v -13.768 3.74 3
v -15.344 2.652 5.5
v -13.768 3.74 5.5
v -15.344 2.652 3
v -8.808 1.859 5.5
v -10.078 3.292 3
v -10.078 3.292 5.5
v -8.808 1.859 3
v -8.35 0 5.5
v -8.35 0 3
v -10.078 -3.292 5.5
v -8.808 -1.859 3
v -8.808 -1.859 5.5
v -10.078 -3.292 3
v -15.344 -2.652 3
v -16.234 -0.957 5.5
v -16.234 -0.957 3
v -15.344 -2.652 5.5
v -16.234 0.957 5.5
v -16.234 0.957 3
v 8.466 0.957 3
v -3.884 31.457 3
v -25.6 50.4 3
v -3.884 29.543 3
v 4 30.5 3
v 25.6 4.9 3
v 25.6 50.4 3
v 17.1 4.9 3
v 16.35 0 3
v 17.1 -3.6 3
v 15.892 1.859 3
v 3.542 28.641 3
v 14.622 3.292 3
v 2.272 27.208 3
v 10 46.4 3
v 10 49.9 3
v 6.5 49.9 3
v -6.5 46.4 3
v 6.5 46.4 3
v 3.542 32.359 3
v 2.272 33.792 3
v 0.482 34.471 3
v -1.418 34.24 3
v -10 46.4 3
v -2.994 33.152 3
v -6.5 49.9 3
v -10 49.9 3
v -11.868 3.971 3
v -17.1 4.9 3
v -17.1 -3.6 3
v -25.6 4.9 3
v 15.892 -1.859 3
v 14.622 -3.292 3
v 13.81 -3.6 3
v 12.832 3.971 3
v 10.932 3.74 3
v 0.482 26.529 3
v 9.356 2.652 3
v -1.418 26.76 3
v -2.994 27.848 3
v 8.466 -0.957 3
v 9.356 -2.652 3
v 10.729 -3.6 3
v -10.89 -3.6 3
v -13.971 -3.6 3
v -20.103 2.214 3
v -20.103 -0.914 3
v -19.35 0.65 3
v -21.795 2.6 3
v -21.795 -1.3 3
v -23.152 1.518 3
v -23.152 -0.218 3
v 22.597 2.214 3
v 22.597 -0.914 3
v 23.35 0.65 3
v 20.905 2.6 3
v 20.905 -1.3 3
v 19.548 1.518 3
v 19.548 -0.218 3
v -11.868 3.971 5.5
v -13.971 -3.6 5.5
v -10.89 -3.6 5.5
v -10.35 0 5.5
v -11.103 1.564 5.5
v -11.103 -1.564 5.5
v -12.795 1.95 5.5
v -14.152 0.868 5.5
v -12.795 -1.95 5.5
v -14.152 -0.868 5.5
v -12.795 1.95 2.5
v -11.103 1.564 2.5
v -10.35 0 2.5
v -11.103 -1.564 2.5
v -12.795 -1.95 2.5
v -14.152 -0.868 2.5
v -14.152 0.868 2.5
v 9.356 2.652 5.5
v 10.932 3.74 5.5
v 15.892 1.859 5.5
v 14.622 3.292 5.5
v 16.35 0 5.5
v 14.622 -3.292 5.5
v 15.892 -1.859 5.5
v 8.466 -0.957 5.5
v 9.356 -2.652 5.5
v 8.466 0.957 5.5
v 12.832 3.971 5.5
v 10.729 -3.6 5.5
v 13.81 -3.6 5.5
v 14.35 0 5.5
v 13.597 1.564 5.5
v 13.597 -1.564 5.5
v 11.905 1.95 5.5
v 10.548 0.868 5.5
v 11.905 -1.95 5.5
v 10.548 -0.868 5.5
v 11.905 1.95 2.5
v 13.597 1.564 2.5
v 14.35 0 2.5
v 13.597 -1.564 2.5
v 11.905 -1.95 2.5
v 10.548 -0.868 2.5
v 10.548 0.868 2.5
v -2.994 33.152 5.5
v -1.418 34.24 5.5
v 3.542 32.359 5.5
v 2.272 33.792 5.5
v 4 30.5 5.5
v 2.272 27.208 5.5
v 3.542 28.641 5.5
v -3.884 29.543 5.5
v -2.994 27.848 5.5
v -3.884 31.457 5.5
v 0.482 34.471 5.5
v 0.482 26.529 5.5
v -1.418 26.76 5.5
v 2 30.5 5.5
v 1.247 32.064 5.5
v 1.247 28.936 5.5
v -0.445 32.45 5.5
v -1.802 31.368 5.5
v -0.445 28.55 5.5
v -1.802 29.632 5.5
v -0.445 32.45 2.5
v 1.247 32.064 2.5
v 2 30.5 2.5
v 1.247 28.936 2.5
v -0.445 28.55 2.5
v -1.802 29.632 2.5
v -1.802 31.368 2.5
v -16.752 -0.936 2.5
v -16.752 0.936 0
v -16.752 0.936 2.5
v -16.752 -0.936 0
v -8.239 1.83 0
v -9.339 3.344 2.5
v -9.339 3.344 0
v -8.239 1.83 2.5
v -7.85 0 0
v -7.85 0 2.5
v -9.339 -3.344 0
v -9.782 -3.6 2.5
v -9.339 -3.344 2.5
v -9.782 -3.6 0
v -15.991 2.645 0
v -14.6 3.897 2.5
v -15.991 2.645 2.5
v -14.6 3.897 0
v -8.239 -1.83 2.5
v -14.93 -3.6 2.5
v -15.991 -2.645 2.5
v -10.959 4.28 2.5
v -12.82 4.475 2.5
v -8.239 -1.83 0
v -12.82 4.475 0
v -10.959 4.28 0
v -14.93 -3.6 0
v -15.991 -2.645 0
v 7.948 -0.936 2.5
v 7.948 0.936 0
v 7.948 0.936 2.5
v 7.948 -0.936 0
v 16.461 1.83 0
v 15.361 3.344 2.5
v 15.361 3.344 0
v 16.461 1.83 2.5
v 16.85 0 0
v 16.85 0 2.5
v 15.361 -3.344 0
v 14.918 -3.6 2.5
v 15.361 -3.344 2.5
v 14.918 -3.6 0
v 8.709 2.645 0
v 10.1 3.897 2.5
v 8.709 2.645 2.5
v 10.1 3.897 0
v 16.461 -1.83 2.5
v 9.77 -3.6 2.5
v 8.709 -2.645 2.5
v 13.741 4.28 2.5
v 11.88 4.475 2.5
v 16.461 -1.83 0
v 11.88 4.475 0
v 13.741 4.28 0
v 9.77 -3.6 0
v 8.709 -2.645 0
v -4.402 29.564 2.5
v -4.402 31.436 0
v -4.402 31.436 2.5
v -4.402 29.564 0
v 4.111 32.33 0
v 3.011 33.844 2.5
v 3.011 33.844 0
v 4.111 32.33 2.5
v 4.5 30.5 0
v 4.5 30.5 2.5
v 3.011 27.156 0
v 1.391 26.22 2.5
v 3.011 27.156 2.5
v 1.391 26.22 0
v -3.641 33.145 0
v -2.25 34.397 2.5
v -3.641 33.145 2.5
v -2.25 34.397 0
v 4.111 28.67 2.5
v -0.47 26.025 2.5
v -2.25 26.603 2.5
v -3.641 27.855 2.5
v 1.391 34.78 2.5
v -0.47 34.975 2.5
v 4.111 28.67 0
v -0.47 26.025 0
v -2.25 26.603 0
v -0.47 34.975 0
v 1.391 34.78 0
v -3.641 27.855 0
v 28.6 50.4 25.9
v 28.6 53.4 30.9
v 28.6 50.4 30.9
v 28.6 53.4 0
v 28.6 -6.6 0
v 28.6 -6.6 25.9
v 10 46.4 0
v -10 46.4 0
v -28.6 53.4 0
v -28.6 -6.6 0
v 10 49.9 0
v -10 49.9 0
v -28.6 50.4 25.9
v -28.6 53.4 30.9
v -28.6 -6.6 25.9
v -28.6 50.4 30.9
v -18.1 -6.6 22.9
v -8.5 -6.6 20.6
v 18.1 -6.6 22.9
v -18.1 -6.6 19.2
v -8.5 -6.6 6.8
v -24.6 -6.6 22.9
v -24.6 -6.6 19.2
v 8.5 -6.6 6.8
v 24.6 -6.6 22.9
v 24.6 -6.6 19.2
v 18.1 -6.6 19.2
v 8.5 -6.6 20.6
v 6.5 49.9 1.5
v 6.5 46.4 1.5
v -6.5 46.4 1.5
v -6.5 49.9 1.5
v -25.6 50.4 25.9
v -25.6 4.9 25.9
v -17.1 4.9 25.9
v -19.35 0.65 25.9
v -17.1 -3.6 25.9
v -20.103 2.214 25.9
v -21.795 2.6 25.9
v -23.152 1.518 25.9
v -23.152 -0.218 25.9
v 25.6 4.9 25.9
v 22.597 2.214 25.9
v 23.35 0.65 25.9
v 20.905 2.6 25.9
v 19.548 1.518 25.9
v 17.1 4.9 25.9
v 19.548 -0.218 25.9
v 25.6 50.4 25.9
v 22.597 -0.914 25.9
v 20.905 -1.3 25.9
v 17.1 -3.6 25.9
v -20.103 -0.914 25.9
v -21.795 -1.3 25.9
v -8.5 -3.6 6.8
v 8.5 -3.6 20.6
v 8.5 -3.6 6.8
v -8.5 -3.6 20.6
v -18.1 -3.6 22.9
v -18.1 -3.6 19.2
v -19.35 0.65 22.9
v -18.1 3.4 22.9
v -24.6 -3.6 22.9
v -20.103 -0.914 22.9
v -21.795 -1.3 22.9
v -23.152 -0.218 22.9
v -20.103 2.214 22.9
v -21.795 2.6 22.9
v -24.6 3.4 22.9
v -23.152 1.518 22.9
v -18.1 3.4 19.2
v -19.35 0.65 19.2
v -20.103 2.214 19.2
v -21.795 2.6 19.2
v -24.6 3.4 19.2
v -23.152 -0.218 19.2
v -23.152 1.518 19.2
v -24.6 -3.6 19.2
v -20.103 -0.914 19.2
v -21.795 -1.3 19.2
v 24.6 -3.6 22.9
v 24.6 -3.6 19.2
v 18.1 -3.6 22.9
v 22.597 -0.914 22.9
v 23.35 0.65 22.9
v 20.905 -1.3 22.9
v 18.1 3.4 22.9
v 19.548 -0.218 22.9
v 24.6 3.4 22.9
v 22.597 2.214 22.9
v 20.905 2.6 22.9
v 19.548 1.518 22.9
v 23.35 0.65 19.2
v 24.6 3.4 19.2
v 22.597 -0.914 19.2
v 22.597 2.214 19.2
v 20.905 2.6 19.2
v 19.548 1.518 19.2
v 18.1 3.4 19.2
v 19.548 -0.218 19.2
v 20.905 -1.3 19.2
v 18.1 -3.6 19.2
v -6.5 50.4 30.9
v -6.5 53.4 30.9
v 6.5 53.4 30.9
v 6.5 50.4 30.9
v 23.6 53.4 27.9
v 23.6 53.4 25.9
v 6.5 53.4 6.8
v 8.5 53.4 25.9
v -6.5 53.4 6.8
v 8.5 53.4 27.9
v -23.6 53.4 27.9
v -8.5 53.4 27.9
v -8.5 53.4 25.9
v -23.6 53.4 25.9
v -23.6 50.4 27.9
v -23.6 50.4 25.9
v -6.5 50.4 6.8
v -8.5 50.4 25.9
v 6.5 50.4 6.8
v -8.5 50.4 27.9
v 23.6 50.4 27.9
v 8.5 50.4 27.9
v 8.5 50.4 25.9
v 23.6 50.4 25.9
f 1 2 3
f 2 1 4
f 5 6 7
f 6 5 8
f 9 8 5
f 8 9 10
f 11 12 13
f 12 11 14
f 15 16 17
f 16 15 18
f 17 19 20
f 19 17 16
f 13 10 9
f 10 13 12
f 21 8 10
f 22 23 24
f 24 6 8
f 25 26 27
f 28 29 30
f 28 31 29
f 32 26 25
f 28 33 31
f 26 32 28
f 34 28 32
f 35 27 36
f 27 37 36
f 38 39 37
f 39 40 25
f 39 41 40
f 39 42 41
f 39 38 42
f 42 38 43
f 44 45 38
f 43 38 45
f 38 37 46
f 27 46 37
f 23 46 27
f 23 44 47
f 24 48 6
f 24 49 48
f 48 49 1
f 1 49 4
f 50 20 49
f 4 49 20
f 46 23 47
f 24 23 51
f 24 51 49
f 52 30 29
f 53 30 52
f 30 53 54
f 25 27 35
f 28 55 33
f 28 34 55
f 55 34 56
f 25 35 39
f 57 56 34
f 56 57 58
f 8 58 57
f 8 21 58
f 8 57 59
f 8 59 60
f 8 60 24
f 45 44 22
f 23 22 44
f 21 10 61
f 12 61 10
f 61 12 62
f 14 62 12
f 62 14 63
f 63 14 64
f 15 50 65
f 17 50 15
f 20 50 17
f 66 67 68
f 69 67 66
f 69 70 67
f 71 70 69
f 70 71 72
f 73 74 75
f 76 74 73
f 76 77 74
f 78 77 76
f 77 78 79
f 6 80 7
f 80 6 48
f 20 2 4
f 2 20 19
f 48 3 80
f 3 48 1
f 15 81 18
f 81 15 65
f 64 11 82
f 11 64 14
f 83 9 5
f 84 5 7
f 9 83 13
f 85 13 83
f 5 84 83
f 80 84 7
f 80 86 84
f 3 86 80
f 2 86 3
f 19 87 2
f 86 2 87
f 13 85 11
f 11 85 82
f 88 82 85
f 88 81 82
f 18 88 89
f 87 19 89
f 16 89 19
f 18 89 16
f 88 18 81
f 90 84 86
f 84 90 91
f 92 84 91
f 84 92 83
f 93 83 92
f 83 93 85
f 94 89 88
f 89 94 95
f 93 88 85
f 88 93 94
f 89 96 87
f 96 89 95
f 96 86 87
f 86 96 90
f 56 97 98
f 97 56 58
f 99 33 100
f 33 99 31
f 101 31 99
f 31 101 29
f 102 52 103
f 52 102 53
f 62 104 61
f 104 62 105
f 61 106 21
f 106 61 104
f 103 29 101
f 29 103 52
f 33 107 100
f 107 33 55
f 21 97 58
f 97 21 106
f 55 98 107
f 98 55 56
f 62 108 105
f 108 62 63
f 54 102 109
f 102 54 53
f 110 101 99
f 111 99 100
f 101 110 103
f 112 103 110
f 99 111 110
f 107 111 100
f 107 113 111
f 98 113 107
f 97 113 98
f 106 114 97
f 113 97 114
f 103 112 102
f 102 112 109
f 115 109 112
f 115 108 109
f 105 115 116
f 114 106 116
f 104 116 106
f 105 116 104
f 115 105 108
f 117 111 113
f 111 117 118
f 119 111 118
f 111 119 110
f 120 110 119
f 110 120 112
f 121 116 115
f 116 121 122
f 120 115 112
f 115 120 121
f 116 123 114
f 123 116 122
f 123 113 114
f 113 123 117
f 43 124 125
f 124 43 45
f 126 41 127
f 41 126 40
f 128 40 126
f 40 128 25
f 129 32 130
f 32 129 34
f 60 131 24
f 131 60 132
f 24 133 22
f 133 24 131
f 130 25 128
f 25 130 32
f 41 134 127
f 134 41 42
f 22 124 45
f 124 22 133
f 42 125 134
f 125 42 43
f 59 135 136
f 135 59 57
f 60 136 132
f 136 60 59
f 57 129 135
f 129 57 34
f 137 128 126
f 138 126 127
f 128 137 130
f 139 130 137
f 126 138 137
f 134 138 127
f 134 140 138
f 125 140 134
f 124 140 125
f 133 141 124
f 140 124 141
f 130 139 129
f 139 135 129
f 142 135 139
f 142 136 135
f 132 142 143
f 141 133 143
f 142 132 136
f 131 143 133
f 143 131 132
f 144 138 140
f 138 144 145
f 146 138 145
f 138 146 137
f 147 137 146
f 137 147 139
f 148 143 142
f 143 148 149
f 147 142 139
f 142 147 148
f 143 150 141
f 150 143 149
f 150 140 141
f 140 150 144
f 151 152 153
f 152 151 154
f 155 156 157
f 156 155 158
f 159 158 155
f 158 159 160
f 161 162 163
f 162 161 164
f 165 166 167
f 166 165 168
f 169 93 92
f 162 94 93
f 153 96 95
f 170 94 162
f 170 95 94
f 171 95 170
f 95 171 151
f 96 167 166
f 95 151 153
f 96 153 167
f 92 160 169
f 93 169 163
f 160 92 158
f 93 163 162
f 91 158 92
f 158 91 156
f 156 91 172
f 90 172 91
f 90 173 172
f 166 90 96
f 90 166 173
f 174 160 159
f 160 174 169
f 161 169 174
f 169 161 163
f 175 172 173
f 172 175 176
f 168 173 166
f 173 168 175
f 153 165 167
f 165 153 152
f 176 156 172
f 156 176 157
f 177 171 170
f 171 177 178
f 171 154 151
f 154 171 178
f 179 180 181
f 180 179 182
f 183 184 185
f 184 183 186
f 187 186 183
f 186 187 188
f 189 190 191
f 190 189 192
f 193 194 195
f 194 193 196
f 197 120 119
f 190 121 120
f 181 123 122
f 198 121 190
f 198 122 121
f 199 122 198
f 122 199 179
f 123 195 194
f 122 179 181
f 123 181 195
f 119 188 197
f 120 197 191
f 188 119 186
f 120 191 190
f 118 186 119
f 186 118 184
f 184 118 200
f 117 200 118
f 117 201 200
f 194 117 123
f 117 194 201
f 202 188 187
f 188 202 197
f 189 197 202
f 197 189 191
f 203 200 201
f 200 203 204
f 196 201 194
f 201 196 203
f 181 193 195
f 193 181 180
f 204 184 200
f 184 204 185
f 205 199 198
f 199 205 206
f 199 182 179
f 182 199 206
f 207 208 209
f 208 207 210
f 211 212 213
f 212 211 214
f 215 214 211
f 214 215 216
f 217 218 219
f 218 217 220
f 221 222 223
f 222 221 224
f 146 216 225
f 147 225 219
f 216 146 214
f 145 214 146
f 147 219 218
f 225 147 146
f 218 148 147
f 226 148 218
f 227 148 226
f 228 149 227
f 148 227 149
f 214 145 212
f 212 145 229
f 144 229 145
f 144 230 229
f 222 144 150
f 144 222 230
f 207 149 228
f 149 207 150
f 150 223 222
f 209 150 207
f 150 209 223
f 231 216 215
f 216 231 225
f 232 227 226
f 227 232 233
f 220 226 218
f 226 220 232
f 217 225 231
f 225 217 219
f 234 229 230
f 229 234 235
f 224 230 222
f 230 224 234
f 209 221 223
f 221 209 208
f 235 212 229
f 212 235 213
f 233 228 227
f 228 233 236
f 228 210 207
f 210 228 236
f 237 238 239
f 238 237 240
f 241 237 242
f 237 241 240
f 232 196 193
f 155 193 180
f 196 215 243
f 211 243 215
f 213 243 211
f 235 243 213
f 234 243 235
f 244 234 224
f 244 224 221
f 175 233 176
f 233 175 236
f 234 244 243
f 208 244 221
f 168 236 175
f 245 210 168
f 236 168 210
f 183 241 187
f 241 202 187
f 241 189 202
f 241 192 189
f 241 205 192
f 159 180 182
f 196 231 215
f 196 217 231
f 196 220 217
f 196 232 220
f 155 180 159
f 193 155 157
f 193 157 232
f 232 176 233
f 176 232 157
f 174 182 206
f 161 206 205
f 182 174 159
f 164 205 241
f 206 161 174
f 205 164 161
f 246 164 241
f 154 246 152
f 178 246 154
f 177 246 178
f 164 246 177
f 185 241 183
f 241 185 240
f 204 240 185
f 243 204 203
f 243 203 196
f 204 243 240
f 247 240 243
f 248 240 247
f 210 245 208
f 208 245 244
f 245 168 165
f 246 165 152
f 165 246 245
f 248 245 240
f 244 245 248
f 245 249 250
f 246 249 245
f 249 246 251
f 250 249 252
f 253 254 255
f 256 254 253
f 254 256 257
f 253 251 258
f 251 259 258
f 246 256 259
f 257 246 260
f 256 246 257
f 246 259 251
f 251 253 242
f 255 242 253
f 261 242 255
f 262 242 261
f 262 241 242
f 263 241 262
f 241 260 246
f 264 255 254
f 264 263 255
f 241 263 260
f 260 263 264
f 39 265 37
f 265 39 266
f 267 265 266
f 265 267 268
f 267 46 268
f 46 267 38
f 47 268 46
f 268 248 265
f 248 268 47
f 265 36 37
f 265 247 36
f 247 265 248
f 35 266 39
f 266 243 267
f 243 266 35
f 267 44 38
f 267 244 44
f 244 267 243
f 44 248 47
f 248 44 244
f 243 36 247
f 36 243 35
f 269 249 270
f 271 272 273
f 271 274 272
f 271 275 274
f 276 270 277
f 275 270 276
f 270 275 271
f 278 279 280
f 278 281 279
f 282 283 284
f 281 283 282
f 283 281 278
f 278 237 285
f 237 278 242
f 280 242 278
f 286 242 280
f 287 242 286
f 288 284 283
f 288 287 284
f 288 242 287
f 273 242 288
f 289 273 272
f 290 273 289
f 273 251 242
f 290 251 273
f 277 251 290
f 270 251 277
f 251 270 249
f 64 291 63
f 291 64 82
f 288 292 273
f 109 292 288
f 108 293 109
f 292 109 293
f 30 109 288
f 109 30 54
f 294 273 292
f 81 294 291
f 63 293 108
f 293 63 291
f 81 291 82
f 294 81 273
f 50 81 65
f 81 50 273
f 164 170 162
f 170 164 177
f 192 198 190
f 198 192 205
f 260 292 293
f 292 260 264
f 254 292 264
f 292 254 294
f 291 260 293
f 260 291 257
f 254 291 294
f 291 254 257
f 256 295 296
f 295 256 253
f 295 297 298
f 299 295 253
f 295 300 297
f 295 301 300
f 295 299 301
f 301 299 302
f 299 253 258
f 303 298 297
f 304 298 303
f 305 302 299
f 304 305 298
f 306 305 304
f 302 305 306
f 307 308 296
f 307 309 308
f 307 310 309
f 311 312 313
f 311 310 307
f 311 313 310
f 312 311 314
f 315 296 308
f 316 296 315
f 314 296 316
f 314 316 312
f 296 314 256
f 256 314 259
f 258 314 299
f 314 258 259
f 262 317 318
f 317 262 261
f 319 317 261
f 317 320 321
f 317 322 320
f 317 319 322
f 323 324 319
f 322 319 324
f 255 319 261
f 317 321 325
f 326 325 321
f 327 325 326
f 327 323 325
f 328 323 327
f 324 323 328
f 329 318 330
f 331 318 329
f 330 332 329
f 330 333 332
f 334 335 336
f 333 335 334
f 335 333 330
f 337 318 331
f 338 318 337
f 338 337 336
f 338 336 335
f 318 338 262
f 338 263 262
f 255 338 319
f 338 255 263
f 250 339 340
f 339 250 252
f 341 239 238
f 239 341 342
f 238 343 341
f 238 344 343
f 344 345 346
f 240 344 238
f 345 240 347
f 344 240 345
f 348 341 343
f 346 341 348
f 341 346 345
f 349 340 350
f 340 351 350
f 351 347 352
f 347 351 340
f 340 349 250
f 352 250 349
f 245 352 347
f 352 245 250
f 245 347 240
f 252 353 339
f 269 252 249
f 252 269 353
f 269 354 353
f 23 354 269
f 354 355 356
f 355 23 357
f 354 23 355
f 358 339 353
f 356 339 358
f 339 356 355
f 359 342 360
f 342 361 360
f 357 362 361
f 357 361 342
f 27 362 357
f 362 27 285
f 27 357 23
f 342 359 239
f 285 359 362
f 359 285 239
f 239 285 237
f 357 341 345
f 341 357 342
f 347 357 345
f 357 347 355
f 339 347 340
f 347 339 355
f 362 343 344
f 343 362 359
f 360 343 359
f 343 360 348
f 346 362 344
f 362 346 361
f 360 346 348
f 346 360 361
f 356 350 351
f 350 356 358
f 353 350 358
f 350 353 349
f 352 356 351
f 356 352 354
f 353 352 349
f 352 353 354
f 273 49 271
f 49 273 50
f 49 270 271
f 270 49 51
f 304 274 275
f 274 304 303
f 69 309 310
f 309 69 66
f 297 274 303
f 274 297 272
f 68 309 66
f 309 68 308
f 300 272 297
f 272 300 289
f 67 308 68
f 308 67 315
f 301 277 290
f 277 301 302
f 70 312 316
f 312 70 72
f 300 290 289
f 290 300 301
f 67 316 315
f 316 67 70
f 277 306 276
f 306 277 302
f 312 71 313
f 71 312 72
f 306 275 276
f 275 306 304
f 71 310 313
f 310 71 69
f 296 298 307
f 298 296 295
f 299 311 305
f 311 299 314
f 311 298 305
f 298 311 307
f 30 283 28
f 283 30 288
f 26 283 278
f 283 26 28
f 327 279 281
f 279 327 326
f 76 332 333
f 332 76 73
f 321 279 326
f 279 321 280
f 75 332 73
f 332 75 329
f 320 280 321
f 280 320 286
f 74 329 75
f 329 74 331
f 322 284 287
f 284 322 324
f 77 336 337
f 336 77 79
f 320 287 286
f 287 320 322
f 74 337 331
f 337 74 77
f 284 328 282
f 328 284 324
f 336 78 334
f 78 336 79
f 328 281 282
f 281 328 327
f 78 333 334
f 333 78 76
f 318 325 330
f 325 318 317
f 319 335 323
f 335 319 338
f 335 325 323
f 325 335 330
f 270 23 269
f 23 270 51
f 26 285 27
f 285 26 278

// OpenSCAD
front_post_hole_offset = 24.7;
front_post_to_pcb_front = 3.6;
front_to_rear_post_hole_offset = 30.5;

panel_depth = 3;  // The width of the case front/back/sides
panel_offset = max(0.5, panel_depth-3);
post_height = 2.5;

// Constants associated with the case lid
rear_tab_height = 2;  // The height of the tab that will lock the lid in place
rear_tab_height_offset = 1; // How much additional clearance to give the tab
tab_side_clearance = 2; // How much clearance to give each side of the tab

pcb_width = 31.6; // Width of the actual PCB (should be greater than front_post_hole_offset)
pcb_depth = 38+6; // Depth of the actual PCB (should be greater than front_to_rear_post_hole_offset);
pcb_height = 1.6; // Height of the PCB fiberglass (part of the RJ-11 offset)

rj_11_width = 17; // Width of the RJ-11 jack (for the hole in the front of the case)
rj_11_height = 13.5+.3; // Height of the RJ-11 jack (for the hole in the front of the case)

exit_hole_width = 13; // Width of the exit hole (in the back of the case)

case_interior_width = pcb_width + 19.6; // Giving 10mm of clearance on either side for wiring, etc. 
case_interior_depth = pcb_depth + 10; // All additional depth is added to the back
case_interior_height = post_height+rj_11_height+pcb_height+5; // This should be equal to post_height + enough room for the RJ-11 jack at a minimum

zip_tie_width = 3.5;


////// These are defined based on the above. Breaking out to make it more explicit what is happening below)
case_exterior_width = case_interior_width + (panel_depth * 2);
case_exterior_depth = case_interior_depth + (panel_depth * 2);
case_exterior_height = case_interior_height + panel_depth;

// Related to the case lid
case_lid_depth = rear_tab_height + rear_tab_height_offset + 2;
tab_width = (case_exterior_width - exit_hole_width - (2*panel_depth) - (4*tab_side_clearance))/2;


// Related to the "nut slot" posts
nut_width = 5.5;
nut_height = 2.5;
nut_post_width = nut_width + 3;
nut_hole_height = nut_height + 1.2;
nut_hole_width = nut_width + 1;
nut_hole_depth = (nut_post_width-nut_width)/2 + nut_width;
nut_hole_height_loc = case_exterior_height - 3 - nut_hole_height;
nut_hole_width_loc = (nut_post_width - nut_hole_width)/2;


module post_with_nut(panel_depth, panel_offset, post_height, negative_only=0) {

    post_radius = 4;
    screw_radius = 2;

    // Used to create a "standard" hex nut object
    module std_hex(hole_depth) {
            width_between_flats = 7;
            flat_width = 4.04;
            module hex_nut(width_between_flats,flat_width,hole_depth) {
                translate([-width_between_flats/2,-flat_width/2,0]) cube([width_between_flats,flat_width,hole_depth]);
                rotate([0,0,-60]) translate([-width_between_flats/2,-flat_width/2,0]) cube([width_between_flats,flat_width,hole_depth]);
                rotate([0,0,60]) translate([-width_between_flats/2,-flat_width/2,0]) cube([width_between_flats,flat_width,hole_depth]);
                
            }
        //hex_nut(width_between_flats,flat_width,hole_depth);
        #cylinder(r=screw_radius*2.25, h=hole_depth);
    }


    if(negative_only == 0) {
        // We're doing the positive part (the actual post that gets printed)
        difference() {
            cylinder(r=post_radius,h=post_height);
            translate([0,0,-((post_height+panel_depth)/2)]) cylinder(r=screw_radius, h=(post_height+panel_depth)*2+.1);
        }
    } else {
        // We're doing the negative part - the hole cylinder and the hex nut
        translate([0,0,-((post_height+panel_depth)/2)]) cylinder(r=screw_radius, h=(post_height+panel_depth)*2+.1);
        translate([0,0,-(panel_depth+.1)]) std_hex(panel_depth+.1-panel_offset);
    }
}

module make_posts(negative_only=0) {
    translate([-front_post_hole_offset/2,0,panel_depth]) post_with_nut(panel_depth, panel_offset, post_height, negative_only);
    translate([front_post_hole_offset/2,0,panel_depth]) post_with_nut(panel_depth, panel_offset, post_height, negative_only);
    translate([0,front_to_rear_post_hole_offset,panel_depth]) post_with_nut(panel_depth, panel_offset, post_height, negative_only);
}

make_posts();


// Make the case base
difference() {
    translate([-(case_exterior_width/2), -(front_post_to_pcb_front+panel_depth), 0]) cube([case_exterior_width, case_exterior_depth, panel_depth]);

    make_posts(1);
    
    translate([-exit_hole_width/2, case_exterior_depth-front_post_to_pcb_front-panel_depth*3-1, -0.1]) cube([exit_hole_width, zip_tie_width, panel_depth/2+0.1]);
    translate([-exit_hole_width/2-zip_tie_width, case_exterior_depth-front_post_to_pcb_front-panel_depth*3-1, -0.1]) cube([zip_tie_width, zip_tie_width, panel_depth+0.2]);
    translate([exit_hole_width/2, case_exterior_depth-front_post_to_pcb_front-panel_depth*3-1, -0.1]) cube([zip_tie_width, zip_tie_width, panel_depth+0.2]);
}

// Make the case front
difference() {
    translate([-(case_exterior_width/2), -(front_post_to_pcb_front+panel_depth), 0]) cube([case_exterior_width, panel_depth, case_exterior_height]);
    translate([-(rj_11_width/2),-(front_post_to_pcb_front+panel_depth+.1),panel_depth+post_height-.3+pcb_height]) cube([rj_11_width, panel_depth+2, rj_11_height]);

    translate([-(case_exterior_width/2)+panel_depth,-(front_post_to_pcb_front),0]) make_nut_hole();
    translate([(case_exterior_width/2)-panel_depth-nut_post_width,-(front_post_to_pcb_front),0]) make_nut_hole();    
    
}

// Make the case left/right
translate([-(case_exterior_width/2),-(front_post_to_pcb_front+panel_depth),0]) cube([panel_depth,case_exterior_depth, case_exterior_height]);
translate([(case_exterior_width/2)-panel_depth,-(front_post_to_pcb_front+panel_depth),0]) cube([panel_depth,case_exterior_depth, case_exterior_height]);


// Make the case rear
translate([0,case_exterior_depth-panel_depth,0]) difference() {
    translate([-(case_exterior_width/2), -(front_post_to_pcb_front+panel_depth), 0]) cube([case_exterior_width, panel_depth, case_exterior_height + case_lid_depth]);
    translate([-(exit_hole_width/2),-(front_post_to_pcb_front+panel_depth+.1),panel_depth+post_height-.3+pcb_height]) cube([exit_hole_width, panel_depth+2, case_exterior_height + case_lid_depth]);
    translate([case_exterior_width/2-tab_width-panel_depth-tab_side_clearance,-(front_post_to_pcb_front+panel_depth+.1),case_exterior_height]) cube([tab_width,panel_depth*2,rear_tab_height]);
    translate([-(case_exterior_width/2)+panel_depth+tab_side_clearance,-(front_post_to_pcb_front+panel_depth+.1),case_exterior_height]) cube([tab_width,panel_depth*2,rear_tab_height]);
}



module make_nut_hole() {
        translate([nut_hole_width_loc,-1-panel_depth,nut_hole_height_loc]) cube([nut_hole_width,nut_hole_depth+1+panel_depth,nut_hole_height]);
}

module make_nut_post() {
    difference() {
        cube([nut_post_width,nut_post_width,case_exterior_height]);
        translate([nut_post_width/2,nut_post_width/2,-1]) cylinder(r=2, h=case_exterior_height+2);
        make_nut_hole();
    }
}

translate([-(case_exterior_width/2)+panel_depth,-(front_post_to_pcb_front),0]) make_nut_post();
translate([(case_exterior_width/2)-panel_depth-nut_post_width,-(front_post_to_pcb_front),0]) make_nut_post();
